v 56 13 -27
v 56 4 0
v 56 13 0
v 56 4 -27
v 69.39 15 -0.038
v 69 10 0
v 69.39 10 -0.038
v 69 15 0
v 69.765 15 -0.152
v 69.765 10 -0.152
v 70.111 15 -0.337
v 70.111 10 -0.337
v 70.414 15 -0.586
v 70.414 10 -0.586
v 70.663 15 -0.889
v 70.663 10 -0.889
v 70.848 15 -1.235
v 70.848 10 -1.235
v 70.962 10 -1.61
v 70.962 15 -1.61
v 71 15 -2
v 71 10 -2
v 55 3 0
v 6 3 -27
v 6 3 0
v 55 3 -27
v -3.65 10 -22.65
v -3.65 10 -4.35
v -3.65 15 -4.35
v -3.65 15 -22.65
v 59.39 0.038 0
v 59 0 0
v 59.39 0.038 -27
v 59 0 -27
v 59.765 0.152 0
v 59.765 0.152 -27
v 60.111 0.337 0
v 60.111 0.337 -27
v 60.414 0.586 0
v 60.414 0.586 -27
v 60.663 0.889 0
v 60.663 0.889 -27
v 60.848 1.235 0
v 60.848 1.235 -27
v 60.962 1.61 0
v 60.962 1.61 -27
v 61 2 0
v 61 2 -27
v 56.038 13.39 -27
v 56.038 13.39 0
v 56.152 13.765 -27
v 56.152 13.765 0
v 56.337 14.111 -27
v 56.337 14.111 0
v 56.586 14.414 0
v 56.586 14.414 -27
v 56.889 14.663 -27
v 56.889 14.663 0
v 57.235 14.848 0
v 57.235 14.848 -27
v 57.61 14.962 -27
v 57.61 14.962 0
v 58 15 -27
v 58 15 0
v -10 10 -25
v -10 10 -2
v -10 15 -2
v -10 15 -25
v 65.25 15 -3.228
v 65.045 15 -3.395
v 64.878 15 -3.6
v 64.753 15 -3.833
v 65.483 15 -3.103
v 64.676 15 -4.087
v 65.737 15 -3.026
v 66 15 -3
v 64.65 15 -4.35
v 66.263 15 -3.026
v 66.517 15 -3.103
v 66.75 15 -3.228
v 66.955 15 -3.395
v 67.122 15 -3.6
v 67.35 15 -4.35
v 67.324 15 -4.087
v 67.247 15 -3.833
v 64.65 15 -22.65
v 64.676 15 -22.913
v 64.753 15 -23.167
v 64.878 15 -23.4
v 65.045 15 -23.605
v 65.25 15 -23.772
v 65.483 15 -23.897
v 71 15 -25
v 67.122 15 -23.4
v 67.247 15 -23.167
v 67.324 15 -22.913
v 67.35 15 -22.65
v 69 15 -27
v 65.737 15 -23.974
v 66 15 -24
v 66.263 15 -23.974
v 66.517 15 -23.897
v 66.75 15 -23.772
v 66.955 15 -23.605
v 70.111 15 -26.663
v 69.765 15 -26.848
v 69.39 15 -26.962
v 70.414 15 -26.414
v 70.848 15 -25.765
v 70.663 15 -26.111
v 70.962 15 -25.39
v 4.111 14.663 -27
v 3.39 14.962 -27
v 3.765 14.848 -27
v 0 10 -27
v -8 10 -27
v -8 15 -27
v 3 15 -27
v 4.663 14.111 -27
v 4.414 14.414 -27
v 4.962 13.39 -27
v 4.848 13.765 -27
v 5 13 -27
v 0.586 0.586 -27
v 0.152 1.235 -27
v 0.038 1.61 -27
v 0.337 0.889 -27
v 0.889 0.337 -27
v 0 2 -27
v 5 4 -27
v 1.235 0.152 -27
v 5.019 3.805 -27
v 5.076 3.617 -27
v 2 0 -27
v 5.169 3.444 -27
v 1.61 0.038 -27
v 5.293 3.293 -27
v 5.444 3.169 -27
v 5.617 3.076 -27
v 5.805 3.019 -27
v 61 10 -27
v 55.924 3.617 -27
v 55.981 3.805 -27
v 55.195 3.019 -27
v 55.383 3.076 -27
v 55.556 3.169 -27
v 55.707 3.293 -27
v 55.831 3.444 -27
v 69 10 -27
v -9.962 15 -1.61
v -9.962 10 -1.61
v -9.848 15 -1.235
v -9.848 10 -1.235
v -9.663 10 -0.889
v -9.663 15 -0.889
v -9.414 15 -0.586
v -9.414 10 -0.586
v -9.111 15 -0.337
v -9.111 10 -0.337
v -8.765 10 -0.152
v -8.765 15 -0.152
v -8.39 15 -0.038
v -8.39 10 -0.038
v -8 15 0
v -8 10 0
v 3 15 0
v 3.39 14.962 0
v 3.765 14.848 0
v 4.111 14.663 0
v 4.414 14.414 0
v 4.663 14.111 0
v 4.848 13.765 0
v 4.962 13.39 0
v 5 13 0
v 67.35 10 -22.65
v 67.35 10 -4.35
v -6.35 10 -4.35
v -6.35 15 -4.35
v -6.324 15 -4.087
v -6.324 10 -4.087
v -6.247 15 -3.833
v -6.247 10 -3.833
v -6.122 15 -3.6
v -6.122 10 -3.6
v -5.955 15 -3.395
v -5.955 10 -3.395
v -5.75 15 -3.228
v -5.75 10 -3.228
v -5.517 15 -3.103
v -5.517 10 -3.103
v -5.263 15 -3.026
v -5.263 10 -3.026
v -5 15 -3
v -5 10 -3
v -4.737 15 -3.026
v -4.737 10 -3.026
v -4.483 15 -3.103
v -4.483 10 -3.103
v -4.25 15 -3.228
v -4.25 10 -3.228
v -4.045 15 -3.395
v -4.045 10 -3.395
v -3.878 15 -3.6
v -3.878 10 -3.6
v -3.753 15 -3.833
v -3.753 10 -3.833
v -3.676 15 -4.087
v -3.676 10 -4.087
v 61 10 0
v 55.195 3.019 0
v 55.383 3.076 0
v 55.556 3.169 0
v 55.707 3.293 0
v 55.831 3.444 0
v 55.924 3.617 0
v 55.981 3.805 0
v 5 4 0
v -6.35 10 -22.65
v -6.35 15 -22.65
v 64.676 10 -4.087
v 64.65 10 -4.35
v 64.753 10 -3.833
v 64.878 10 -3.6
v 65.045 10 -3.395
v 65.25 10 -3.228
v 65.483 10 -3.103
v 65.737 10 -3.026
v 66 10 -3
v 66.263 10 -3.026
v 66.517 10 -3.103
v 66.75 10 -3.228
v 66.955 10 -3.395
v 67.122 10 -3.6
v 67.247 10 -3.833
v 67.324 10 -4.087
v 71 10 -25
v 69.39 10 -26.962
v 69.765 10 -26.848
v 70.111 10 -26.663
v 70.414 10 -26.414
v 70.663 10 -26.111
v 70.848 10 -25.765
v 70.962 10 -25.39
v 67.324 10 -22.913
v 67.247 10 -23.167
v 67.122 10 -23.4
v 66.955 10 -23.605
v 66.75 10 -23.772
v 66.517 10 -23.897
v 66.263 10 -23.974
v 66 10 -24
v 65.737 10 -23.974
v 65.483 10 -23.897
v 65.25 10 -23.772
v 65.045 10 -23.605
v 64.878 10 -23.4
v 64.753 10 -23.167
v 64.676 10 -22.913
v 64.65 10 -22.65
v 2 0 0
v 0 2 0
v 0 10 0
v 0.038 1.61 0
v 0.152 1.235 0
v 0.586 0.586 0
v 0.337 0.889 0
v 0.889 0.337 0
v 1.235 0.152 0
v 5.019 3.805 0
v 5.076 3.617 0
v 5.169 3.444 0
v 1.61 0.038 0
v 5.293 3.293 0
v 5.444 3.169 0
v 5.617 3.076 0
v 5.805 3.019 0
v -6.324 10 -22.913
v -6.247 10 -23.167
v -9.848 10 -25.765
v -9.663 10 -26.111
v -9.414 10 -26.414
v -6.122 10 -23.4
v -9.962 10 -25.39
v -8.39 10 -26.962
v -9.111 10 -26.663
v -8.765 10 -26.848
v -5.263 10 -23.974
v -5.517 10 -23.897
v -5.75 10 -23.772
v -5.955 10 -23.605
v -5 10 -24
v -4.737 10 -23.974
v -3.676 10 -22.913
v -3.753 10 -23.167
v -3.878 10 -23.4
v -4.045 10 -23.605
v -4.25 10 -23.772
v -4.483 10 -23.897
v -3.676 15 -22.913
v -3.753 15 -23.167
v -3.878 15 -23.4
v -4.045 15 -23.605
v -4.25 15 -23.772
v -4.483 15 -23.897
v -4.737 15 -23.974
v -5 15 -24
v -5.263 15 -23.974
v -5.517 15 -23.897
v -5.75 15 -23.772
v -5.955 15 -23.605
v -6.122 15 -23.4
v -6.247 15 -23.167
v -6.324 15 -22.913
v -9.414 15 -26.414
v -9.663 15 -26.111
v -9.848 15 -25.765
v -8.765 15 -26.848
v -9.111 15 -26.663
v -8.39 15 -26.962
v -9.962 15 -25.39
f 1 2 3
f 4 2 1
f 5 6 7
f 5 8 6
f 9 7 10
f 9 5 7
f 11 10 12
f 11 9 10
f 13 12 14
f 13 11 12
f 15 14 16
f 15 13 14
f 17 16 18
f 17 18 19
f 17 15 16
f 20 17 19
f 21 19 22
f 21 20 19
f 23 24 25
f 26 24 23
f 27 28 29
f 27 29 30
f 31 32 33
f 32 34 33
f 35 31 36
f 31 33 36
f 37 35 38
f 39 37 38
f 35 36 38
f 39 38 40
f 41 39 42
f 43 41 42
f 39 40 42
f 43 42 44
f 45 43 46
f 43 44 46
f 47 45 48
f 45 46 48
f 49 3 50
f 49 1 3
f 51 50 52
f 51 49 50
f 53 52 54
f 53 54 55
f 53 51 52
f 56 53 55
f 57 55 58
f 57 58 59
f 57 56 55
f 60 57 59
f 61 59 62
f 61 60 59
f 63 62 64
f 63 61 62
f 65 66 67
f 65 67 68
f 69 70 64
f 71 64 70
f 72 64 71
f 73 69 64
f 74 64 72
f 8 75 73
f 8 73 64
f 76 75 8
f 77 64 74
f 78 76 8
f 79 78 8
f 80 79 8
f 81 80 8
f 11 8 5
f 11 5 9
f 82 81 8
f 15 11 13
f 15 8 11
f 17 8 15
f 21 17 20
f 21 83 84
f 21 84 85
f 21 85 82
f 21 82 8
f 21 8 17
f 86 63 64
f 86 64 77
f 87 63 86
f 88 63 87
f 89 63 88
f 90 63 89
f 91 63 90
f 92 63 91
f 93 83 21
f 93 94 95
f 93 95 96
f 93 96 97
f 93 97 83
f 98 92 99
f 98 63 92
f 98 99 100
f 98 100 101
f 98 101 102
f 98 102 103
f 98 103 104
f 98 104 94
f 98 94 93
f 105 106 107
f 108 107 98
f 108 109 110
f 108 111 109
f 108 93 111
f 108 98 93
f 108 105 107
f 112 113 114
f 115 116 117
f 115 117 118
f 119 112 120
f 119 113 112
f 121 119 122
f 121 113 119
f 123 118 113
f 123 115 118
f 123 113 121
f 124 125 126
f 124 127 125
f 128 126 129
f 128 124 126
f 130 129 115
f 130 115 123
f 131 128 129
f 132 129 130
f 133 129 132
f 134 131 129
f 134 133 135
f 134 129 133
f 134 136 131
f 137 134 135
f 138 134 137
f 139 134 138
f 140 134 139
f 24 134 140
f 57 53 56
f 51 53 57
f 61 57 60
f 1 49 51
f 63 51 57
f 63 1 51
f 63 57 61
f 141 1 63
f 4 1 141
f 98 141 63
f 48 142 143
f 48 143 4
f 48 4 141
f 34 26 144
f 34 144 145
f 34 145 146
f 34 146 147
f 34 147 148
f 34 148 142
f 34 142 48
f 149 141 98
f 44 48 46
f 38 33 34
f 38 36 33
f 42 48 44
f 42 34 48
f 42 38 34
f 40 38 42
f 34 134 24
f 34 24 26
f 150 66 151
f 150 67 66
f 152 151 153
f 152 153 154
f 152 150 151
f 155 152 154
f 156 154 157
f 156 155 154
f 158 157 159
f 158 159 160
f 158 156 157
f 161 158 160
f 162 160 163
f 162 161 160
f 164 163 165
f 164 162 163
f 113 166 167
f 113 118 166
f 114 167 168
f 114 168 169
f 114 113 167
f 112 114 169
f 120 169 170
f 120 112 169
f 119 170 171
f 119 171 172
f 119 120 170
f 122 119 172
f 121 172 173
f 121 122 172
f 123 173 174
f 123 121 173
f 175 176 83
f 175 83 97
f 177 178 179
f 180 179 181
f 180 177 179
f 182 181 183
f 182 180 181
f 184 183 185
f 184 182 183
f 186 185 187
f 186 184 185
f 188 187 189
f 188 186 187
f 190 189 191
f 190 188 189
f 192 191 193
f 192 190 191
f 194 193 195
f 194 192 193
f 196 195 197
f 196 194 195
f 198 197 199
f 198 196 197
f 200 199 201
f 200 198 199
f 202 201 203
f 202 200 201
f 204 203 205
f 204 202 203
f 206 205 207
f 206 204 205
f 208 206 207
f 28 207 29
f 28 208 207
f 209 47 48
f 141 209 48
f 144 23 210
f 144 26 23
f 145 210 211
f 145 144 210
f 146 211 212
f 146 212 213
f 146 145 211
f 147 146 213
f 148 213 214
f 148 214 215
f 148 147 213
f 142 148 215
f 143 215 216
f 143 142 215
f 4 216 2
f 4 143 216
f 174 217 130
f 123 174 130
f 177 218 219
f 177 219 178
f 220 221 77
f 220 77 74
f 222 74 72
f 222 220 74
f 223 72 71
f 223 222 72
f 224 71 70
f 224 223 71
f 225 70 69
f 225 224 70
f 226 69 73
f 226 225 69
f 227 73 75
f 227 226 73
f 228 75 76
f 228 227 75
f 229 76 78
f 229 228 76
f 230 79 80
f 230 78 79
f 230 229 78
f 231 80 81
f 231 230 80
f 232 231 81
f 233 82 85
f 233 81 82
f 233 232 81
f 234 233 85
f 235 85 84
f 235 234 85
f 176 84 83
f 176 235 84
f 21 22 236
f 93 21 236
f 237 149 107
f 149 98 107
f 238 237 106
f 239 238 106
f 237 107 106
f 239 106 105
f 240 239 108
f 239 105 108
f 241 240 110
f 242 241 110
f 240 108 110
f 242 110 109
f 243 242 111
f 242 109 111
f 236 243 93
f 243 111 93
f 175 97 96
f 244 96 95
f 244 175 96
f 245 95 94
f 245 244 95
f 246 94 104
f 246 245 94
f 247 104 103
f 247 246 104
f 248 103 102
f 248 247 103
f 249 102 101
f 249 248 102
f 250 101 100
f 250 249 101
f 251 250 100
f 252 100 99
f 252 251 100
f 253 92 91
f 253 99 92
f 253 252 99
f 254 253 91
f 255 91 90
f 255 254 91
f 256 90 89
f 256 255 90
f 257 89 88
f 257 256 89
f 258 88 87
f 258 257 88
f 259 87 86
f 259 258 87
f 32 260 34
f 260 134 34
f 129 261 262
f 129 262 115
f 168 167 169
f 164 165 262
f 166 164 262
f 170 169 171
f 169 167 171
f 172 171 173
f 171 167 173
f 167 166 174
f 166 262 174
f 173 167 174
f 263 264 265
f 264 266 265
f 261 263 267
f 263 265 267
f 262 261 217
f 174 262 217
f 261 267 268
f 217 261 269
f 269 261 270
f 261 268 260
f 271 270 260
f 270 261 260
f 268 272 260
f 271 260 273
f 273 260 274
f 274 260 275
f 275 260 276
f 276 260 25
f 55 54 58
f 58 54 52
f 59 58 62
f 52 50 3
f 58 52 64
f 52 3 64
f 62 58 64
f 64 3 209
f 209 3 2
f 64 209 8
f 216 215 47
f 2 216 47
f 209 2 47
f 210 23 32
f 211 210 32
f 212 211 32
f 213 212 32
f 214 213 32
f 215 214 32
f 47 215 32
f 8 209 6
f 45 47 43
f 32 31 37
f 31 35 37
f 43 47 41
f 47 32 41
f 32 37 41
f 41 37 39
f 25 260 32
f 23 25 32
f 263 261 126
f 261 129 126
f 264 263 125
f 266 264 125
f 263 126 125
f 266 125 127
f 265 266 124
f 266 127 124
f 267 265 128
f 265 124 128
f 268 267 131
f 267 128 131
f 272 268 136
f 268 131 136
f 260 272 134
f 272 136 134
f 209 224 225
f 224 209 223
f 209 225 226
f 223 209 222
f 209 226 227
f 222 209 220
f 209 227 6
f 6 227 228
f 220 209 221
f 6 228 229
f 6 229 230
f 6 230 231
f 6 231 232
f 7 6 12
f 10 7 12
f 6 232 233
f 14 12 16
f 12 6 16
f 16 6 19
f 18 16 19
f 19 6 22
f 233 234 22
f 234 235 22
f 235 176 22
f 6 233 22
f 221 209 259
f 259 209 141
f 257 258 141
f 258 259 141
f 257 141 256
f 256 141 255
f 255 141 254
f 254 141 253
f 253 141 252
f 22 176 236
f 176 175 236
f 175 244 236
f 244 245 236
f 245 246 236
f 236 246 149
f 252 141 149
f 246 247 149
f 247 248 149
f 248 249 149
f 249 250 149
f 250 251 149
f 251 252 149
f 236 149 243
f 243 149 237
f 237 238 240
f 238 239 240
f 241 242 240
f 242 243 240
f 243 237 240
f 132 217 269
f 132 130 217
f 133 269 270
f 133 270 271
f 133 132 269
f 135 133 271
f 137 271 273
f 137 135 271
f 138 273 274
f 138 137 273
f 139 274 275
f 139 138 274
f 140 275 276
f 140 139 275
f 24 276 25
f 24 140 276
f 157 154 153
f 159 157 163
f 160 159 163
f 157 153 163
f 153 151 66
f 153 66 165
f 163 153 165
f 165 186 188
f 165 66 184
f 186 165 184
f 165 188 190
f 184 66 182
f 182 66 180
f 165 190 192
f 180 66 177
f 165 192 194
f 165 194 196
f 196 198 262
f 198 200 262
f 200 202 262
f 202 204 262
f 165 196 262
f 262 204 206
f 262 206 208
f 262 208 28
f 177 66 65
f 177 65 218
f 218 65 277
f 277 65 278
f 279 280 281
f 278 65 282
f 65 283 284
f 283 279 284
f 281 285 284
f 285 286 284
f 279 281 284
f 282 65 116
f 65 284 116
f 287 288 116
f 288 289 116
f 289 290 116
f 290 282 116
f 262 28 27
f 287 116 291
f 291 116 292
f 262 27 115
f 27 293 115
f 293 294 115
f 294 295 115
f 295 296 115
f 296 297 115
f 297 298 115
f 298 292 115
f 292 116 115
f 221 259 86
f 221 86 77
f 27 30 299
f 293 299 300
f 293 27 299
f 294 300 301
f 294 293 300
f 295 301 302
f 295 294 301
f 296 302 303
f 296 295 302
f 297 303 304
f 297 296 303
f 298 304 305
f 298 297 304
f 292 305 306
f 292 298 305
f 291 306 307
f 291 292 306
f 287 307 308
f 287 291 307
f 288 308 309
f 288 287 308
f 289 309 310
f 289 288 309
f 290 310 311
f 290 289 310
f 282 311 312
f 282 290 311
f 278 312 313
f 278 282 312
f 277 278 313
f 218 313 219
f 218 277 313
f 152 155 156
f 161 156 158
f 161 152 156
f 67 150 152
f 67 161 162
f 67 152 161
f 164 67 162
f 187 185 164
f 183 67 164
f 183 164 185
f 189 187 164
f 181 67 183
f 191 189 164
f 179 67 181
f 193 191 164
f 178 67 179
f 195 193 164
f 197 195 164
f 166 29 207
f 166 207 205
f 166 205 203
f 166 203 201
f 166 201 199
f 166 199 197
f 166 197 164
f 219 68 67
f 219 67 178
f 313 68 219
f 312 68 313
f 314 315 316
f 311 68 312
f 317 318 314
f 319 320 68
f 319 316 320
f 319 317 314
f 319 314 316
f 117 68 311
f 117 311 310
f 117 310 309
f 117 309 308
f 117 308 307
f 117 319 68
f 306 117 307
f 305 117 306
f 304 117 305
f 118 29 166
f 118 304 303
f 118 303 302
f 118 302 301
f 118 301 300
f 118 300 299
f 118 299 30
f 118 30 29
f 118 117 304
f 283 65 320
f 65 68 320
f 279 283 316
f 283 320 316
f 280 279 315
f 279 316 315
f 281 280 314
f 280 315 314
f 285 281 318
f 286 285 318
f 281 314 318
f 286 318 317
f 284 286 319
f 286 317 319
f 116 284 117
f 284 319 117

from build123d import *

# Parameters (mm, degrees)
SKETCH1_W           = 61
SKETCH1_H           = 27
BOSS_EXTRUDE1_DEPTH = 3
SKETCH2_W           = 5
SKETCH2_H           = 27
BOSS_EXTRUDE2_DEPTH = 7
SKETCH3_W           = 15
SKETCH3_H           = 27
BOSS_EXTRUDE3_DEPTH = 5
CUT_EXTRUDE1_DEPTH  = 77.615925238
FILLET1_R           = 2
FILLET2_R           = 2
FILLET3_R           = 1


with BuildPart() as part:
    # Sketch1 → Boss-Extrude1 (new body)
    with BuildSketch(Plane(origin=(0, 0, 0), x_dir=(1, 0, 0), z_dir=(0, 1, 0))):
        with Locations((30.5, 13.5)):
            Rectangle(SKETCH1_W, SKETCH1_H)
    extrude(amount=BOSS_EXTRUDE1_DEPTH)

    # Sketch2 → Boss-Extrude2 (add)
    with BuildSketch(Plane(origin=(0, 3, 0), x_dir=(1, 0, 0), z_dir=(0, 1, 0))):
        with Locations((2.5, 13.5)):
            Rectangle(SKETCH2_W, SKETCH2_H)
        with Locations((58.5, 13.5)):
            Rectangle(SKETCH2_W, SKETCH2_H)
    extrude(amount=BOSS_EXTRUDE2_DEPTH)

    # Sketch3 → Boss-Extrude3 (add)
    with BuildSketch(Plane(origin=(0, 10, 0), x_dir=(1, 0, 0), z_dir=(0, 1, 0))):
        with Locations((-2.5, 13.5)):
            Rectangle(SKETCH3_W, SKETCH3_H)
        with Locations((63.5, 13.5)):
            Rectangle(SKETCH3_W, SKETCH3_H)
    extrude(amount=BOSS_EXTRUDE3_DEPTH)

    # Sketch4 → Cut-Extrude1 (cut, through all)
    with BuildSketch(Plane.XZ.offset(-10)):
        with BuildLine():
            Line((-3.65, -4.35), (-3.65, -22.65))
            ThreePointArc((-3.65, -22.65), (-5, -24), (-6.35, -22.65))
            Line((-6.35, -22.65), (-6.35, -4.35))
            ThreePointArc((-6.35, -4.35), (-5, -3), (-3.65, -4.35))
        make_face()
        with BuildLine():
            Line((67.35, -4.35), (67.35, -22.65))
            ThreePointArc((67.35, -22.65), (66, -24), (64.65, -22.65))
            Line((64.65, -22.65), (64.65, -4.35))
            ThreePointArc((64.65, -4.35), (66, -3), (67.35, -4.35))
        make_face()
    extrude(amount=-CUT_EXTRUDE1_DEPTH, mode=Mode.SUBTRACT)

    # Fillet1
    fillet1_edges = [part.edges().sort_by_distance(p)[0] for p in [
        (-10, 12.5, -27),
        (-10, 12.5, 0),
        (71, 12.5, 0),
        (71, 12.5, -27),
    ]]
    fillet(fillet1_edges, radius=FILLET1_R)

    # Fillet2
    fillet2_edges = [part.edges().sort_by_distance(p)[0] for p in [
        (5, 15, -13.5),
        (56, 15, -13.5),
        (61, 0, -13.5),
        (0, 0, -13.5),
    ]]
    fillet(fillet2_edges, radius=FILLET2_R)

    # Fillet3
    fillet3_edges = [part.edges().sort_by_distance(p)[0] for p in [
        (5, 3, -13.5),
        (56, 3, -13.5),
    ]]
    fillet(fillet3_edges, radius=FILLET3_R)


solid = part.part
